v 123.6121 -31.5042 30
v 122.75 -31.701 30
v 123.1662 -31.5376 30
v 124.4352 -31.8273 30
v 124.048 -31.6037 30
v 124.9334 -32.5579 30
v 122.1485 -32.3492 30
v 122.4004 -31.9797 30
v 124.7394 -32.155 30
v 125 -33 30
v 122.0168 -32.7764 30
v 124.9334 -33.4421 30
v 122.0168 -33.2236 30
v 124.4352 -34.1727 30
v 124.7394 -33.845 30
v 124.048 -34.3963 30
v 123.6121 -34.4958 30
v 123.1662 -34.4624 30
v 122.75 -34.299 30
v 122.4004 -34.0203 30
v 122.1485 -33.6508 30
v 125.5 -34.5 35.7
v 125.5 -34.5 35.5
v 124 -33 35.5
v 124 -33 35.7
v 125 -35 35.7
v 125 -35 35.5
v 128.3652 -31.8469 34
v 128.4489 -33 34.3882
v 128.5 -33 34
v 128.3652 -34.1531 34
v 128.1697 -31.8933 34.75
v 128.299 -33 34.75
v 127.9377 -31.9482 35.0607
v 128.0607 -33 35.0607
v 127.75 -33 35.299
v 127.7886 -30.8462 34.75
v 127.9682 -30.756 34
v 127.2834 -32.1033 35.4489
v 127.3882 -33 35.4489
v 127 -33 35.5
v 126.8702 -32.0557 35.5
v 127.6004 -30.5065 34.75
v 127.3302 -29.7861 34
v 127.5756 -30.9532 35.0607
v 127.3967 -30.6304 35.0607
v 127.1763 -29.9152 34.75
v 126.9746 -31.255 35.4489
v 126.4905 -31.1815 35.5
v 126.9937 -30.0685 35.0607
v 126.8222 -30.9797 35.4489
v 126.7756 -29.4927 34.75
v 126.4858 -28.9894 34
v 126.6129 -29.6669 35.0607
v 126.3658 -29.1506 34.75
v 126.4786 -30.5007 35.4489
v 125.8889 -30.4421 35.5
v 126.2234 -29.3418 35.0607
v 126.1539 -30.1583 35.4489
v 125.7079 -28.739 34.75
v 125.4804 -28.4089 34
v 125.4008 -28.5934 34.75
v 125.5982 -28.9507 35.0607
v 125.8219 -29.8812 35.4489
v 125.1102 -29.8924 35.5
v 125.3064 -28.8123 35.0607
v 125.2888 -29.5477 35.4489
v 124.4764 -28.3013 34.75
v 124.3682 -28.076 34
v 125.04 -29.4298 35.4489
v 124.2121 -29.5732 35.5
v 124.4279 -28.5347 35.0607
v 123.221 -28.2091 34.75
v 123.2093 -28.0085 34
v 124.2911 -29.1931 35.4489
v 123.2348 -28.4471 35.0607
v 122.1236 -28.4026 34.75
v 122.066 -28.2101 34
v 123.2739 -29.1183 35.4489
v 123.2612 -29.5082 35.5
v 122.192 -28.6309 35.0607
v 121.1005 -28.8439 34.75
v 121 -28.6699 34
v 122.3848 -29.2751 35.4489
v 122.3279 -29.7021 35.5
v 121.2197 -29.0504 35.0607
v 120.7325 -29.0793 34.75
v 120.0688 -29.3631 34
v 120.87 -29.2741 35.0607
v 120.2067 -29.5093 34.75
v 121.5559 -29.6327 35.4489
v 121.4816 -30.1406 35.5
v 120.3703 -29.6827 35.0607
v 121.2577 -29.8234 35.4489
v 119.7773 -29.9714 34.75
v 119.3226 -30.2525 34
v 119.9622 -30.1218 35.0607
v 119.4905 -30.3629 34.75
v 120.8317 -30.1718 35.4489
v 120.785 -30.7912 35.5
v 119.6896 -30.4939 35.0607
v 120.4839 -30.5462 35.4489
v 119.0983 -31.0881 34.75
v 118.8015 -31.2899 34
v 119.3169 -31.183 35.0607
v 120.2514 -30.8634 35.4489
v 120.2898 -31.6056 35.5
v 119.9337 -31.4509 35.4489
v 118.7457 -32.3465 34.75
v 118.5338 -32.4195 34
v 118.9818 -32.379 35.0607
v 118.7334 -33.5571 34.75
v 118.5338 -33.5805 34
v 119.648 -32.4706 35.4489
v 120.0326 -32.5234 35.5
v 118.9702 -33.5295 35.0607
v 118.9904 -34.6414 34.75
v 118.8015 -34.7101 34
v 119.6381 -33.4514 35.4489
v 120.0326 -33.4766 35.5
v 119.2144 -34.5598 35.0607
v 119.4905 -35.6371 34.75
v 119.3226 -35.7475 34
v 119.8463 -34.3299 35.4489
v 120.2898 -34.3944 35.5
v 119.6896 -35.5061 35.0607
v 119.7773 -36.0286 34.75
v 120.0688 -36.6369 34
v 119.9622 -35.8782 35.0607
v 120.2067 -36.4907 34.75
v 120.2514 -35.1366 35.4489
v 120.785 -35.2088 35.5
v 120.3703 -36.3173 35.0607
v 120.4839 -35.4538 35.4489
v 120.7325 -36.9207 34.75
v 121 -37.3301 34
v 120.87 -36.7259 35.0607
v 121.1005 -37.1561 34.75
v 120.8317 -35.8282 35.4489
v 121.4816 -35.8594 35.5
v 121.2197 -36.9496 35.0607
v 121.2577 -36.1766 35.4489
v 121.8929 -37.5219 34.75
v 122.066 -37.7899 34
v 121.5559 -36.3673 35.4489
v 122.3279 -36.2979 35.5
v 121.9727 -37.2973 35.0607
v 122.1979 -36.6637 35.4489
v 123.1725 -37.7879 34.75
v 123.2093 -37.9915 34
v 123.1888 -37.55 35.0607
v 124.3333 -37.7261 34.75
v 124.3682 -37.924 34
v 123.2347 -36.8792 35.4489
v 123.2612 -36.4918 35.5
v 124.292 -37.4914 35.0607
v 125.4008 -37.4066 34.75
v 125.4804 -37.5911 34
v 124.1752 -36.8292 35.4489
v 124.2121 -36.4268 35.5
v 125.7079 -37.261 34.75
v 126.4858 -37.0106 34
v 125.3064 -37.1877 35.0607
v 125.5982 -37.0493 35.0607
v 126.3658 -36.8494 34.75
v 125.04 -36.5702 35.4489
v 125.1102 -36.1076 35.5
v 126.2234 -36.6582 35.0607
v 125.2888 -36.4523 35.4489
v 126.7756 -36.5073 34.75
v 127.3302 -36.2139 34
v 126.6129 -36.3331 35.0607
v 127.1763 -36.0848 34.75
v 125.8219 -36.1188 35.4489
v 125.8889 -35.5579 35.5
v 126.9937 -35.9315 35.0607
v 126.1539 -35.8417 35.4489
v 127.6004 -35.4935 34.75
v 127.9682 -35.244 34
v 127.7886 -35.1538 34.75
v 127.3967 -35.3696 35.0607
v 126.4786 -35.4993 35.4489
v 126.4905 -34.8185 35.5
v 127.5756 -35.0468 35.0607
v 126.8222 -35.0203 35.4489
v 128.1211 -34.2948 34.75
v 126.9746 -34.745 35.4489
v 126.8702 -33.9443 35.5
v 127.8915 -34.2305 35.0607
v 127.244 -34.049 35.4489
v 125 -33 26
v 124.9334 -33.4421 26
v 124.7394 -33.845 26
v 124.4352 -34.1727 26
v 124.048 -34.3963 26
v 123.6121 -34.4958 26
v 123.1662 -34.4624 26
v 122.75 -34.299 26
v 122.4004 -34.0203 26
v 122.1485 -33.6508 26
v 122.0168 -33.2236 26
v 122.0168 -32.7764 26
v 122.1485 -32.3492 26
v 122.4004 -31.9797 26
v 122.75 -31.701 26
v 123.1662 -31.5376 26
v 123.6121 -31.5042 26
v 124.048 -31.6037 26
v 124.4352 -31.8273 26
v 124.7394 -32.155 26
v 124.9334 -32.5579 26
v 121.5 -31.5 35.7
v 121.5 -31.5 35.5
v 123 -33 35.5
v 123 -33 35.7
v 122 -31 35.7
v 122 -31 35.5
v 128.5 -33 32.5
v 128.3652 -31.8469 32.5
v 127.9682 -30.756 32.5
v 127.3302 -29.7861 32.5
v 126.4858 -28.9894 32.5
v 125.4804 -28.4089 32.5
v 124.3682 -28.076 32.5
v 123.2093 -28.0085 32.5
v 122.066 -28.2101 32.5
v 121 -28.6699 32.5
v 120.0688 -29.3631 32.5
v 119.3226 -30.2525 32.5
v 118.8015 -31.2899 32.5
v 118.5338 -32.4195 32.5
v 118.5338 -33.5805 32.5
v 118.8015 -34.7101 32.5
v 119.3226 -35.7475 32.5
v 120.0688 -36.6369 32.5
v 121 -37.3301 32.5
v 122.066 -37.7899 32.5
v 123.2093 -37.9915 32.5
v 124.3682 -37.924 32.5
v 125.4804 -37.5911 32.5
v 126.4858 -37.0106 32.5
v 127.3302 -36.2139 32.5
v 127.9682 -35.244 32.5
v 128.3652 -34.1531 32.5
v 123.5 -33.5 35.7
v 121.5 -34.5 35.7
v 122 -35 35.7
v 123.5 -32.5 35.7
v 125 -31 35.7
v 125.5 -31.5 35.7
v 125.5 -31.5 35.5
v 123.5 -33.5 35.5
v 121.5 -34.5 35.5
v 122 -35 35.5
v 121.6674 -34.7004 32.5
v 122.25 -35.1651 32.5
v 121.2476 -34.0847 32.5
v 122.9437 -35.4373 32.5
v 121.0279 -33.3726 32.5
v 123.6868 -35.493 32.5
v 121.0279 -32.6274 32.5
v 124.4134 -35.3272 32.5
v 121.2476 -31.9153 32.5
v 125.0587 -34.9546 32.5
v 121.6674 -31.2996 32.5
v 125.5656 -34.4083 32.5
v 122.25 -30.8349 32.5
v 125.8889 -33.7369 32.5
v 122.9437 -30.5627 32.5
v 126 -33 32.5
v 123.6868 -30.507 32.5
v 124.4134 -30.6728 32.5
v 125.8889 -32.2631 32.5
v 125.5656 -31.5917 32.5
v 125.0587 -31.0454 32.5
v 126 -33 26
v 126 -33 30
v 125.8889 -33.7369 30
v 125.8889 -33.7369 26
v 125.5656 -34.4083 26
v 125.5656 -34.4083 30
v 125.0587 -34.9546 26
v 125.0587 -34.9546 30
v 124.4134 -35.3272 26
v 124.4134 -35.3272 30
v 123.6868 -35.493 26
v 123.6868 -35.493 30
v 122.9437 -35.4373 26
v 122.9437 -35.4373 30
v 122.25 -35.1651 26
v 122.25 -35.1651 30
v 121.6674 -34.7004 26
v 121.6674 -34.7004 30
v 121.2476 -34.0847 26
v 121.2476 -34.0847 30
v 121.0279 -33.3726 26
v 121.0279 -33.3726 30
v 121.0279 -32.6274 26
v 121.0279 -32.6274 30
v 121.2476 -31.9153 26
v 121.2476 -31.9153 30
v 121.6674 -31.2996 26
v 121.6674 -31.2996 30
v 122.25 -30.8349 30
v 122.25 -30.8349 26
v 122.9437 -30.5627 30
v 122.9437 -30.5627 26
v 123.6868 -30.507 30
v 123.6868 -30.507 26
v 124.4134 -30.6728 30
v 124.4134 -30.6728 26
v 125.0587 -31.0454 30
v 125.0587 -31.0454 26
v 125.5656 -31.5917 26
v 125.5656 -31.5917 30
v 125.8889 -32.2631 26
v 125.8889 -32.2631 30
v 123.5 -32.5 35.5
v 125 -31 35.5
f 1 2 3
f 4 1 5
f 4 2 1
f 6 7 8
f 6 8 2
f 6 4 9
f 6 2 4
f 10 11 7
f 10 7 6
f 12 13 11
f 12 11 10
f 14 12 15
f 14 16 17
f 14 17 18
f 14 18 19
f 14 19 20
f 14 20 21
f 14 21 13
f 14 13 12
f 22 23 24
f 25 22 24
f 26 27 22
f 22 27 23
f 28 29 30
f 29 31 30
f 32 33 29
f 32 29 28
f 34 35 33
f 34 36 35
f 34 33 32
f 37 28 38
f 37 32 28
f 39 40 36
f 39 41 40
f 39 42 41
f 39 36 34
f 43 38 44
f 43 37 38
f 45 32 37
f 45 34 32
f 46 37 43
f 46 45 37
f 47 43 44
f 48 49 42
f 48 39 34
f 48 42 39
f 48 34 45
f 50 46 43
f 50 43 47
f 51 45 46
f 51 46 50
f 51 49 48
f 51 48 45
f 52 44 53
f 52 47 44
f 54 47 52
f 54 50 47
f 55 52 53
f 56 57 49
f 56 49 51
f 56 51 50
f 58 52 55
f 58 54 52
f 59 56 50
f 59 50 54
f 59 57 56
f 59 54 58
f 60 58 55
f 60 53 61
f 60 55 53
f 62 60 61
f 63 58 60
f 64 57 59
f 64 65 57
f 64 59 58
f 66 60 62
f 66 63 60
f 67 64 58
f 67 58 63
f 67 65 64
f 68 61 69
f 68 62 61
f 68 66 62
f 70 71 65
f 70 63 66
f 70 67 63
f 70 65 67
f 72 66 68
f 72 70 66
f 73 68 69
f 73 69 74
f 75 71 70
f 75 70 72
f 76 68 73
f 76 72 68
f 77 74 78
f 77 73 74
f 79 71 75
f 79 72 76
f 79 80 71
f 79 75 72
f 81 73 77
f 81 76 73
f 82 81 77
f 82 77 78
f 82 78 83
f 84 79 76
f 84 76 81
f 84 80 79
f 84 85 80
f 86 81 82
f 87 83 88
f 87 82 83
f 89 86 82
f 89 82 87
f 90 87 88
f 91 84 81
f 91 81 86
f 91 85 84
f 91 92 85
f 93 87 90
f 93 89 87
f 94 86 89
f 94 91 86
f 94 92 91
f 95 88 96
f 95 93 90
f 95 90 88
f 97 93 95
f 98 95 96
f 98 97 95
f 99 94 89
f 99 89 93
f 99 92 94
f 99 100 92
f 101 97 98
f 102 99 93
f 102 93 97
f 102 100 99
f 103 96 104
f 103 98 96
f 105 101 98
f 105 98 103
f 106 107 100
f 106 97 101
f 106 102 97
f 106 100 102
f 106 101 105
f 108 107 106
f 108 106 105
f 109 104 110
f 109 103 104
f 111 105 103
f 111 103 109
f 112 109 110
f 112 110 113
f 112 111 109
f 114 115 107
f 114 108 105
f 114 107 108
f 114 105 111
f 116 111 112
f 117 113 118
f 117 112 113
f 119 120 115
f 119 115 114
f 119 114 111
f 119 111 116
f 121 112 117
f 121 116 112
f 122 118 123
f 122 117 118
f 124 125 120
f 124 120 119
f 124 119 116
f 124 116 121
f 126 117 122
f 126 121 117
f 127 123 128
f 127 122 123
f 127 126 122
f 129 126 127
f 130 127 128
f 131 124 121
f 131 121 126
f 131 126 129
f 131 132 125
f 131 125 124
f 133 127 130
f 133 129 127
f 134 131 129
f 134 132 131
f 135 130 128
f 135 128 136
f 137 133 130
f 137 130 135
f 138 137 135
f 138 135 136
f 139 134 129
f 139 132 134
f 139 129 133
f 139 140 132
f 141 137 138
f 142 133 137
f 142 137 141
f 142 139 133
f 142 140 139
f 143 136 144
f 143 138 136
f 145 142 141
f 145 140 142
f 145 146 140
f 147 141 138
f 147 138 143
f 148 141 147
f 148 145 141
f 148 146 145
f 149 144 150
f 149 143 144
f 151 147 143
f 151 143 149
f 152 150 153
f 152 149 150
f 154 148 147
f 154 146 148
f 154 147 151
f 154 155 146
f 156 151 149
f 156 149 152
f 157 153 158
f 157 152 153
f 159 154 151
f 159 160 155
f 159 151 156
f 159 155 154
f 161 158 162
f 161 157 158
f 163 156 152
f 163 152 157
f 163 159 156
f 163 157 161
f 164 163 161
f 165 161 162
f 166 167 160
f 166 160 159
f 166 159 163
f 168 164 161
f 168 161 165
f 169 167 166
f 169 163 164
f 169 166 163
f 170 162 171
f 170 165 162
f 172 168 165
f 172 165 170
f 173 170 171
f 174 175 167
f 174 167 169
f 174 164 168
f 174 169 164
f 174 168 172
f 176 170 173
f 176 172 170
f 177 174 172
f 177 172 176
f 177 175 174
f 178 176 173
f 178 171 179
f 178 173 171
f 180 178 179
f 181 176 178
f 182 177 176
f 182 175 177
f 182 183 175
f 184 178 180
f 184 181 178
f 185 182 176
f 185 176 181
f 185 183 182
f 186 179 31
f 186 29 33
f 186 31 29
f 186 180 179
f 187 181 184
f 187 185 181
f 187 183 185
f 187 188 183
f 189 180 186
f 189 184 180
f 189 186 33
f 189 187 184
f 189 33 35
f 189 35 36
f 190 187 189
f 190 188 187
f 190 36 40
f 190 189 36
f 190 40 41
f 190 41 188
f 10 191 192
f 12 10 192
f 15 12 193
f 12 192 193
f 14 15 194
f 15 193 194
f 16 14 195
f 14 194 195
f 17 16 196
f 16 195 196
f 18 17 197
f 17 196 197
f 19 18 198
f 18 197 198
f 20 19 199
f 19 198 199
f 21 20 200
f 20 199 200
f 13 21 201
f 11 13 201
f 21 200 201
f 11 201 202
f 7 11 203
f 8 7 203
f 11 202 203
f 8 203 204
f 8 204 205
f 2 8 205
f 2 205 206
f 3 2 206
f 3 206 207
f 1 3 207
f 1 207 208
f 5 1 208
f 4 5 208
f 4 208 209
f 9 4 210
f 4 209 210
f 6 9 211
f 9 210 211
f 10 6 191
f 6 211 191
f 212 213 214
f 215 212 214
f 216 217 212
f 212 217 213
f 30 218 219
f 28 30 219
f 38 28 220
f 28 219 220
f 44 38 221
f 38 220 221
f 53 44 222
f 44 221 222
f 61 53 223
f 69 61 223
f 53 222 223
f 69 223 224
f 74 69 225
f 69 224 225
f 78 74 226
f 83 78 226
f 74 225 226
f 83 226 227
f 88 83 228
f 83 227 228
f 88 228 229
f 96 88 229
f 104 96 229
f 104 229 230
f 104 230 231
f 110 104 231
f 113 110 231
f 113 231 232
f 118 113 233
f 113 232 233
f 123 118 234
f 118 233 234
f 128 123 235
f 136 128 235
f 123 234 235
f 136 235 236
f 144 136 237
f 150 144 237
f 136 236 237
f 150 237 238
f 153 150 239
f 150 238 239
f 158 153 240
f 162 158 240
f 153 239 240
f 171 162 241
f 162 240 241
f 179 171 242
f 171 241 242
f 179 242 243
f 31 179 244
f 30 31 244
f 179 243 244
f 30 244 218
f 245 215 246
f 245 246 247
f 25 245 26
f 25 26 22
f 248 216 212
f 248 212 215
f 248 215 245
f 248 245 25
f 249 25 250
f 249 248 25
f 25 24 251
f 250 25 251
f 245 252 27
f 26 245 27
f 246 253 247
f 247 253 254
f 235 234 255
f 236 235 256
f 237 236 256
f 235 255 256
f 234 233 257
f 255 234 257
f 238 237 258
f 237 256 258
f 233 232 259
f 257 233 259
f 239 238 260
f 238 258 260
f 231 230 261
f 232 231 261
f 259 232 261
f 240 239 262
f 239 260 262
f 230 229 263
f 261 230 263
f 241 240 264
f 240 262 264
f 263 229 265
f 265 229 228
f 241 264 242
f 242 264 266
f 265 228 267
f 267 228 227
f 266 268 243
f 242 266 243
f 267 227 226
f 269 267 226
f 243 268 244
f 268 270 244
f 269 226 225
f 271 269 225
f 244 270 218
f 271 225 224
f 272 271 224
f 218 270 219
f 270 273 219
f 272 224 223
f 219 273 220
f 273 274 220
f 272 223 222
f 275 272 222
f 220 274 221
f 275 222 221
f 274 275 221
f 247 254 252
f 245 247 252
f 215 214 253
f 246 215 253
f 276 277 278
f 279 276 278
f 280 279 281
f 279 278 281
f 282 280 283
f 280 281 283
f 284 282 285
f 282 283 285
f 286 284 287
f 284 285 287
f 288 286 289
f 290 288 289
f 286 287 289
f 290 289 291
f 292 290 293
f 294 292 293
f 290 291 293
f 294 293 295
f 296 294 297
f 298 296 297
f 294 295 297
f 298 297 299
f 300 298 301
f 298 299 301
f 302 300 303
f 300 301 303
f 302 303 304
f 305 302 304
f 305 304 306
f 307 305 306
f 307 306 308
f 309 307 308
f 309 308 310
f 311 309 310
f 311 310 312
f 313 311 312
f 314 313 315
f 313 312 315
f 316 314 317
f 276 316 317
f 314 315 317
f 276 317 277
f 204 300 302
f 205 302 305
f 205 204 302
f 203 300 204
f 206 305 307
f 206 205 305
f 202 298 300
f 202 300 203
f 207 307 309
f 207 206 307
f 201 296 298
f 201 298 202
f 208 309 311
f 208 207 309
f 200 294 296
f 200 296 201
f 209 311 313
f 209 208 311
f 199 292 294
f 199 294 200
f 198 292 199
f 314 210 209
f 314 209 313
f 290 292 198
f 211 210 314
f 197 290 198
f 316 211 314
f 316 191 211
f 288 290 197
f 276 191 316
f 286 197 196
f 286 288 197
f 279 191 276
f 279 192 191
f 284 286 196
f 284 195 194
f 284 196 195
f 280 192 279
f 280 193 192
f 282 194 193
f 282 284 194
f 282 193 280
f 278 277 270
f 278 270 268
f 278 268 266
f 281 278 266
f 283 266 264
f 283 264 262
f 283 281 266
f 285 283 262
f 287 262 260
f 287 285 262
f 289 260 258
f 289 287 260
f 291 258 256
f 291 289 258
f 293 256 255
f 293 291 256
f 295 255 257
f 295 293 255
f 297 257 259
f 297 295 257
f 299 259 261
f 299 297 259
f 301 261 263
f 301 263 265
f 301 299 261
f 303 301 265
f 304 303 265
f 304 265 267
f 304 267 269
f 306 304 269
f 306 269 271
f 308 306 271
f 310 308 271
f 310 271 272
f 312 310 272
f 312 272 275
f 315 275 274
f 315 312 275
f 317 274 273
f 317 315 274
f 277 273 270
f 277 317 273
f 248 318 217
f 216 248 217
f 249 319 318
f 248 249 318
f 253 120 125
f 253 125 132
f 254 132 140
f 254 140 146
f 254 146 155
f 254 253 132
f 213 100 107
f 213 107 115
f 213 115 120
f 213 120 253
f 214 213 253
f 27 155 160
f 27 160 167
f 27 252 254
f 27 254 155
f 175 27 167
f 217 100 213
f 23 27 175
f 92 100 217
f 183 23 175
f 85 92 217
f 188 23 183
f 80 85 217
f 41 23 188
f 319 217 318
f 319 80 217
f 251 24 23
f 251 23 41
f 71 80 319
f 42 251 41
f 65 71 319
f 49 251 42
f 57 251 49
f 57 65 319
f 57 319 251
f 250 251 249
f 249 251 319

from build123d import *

# Parameters (mm, degrees)
SKETCH046_R     = 2.5
PAD023_DEPTH    = 2.5
SKETCH047_R     = 5
PAD024_DEPTH    = 3
FILLET003_R     = 1.5
SKETCH049_R     = 2.5
PAD025_DEPTH    = 4
SKETCH050_R     = 1.5
POCKET026_DEPTH = 4
PAD059_DEPTH    = 0.2


with BuildPart() as part:
    # Sketch046 → Pad023 (new body)
    with BuildSketch(Plane(origin=(0, 0, 30), x_dir=(1, 0, 0), z_dir=(0, 0, -1))):
        with Locations((101, 55)):
            Circle(SKETCH046_R)
    extrude(amount=-PAD023_DEPTH)

    # Sketch047 (on Face3 of Pad023) → Pad024 (join)
    with BuildSketch(Plane.XY.offset(32.5)):
        with Locations((101, -55)):
            Circle(SKETCH047_R)
    extrude(amount=PAD024_DEPTH)

    # Fillet003
    fillet003_edges = [part.edges().sort_by_distance(p)[0] for p in [
        (96, -55, 35.5),
    ]]
    fillet(fillet003_edges, radius=FILLET003_R)

    # Sketch049 → Pad025 (join)
    with BuildSketch(Plane(origin=(0, 0, 30), x_dir=(1, 0, 0), z_dir=(0, 0, -1))):
        with Locations((101, 55)):
            Circle(SKETCH049_R)
    extrude(amount=PAD025_DEPTH)

    # Sketch050 (on Face17 of Pad025) → Pocket026 (cut)
    with BuildSketch(Plane(origin=(0, 0, 26), x_dir=(1, 0, 0), z_dir=(0, 0, -1))):
        with Locations((101, 55)):
            Circle(SKETCH050_R)
    extrude(amount=-POCKET026_DEPTH, mode=Mode.SUBTRACT)


with BuildPart() as part_1:
    # Body002 placement: moved
    add(part.part.moved(Location((75, 0, 0))))

    # Sketch093 (on Face4 of Clone007) → Pad059 (new body)
    with BuildSketch(Plane(origin=(75, 0, 35.5), x_dir=(1, 0, 0), z_dir=(0, 0, 1))):
        Polygon((99.5, -53), (99, -53.5), (100.5, -55), (99, -56.5), (99.5, -57), (101, -55.5), (102.5, -57), (103, -56.5), (101.5, -55), (103, -53.5), (102.5, -53), (101, -54.5), align=None)
    extrude(amount=PAD059_DEPTH)


with BuildPart() as part_2:
    # Body016 placement: moved
    add(part_1.part.moved(Location((-52.5, 22, 0))))


solid = part_2.part
